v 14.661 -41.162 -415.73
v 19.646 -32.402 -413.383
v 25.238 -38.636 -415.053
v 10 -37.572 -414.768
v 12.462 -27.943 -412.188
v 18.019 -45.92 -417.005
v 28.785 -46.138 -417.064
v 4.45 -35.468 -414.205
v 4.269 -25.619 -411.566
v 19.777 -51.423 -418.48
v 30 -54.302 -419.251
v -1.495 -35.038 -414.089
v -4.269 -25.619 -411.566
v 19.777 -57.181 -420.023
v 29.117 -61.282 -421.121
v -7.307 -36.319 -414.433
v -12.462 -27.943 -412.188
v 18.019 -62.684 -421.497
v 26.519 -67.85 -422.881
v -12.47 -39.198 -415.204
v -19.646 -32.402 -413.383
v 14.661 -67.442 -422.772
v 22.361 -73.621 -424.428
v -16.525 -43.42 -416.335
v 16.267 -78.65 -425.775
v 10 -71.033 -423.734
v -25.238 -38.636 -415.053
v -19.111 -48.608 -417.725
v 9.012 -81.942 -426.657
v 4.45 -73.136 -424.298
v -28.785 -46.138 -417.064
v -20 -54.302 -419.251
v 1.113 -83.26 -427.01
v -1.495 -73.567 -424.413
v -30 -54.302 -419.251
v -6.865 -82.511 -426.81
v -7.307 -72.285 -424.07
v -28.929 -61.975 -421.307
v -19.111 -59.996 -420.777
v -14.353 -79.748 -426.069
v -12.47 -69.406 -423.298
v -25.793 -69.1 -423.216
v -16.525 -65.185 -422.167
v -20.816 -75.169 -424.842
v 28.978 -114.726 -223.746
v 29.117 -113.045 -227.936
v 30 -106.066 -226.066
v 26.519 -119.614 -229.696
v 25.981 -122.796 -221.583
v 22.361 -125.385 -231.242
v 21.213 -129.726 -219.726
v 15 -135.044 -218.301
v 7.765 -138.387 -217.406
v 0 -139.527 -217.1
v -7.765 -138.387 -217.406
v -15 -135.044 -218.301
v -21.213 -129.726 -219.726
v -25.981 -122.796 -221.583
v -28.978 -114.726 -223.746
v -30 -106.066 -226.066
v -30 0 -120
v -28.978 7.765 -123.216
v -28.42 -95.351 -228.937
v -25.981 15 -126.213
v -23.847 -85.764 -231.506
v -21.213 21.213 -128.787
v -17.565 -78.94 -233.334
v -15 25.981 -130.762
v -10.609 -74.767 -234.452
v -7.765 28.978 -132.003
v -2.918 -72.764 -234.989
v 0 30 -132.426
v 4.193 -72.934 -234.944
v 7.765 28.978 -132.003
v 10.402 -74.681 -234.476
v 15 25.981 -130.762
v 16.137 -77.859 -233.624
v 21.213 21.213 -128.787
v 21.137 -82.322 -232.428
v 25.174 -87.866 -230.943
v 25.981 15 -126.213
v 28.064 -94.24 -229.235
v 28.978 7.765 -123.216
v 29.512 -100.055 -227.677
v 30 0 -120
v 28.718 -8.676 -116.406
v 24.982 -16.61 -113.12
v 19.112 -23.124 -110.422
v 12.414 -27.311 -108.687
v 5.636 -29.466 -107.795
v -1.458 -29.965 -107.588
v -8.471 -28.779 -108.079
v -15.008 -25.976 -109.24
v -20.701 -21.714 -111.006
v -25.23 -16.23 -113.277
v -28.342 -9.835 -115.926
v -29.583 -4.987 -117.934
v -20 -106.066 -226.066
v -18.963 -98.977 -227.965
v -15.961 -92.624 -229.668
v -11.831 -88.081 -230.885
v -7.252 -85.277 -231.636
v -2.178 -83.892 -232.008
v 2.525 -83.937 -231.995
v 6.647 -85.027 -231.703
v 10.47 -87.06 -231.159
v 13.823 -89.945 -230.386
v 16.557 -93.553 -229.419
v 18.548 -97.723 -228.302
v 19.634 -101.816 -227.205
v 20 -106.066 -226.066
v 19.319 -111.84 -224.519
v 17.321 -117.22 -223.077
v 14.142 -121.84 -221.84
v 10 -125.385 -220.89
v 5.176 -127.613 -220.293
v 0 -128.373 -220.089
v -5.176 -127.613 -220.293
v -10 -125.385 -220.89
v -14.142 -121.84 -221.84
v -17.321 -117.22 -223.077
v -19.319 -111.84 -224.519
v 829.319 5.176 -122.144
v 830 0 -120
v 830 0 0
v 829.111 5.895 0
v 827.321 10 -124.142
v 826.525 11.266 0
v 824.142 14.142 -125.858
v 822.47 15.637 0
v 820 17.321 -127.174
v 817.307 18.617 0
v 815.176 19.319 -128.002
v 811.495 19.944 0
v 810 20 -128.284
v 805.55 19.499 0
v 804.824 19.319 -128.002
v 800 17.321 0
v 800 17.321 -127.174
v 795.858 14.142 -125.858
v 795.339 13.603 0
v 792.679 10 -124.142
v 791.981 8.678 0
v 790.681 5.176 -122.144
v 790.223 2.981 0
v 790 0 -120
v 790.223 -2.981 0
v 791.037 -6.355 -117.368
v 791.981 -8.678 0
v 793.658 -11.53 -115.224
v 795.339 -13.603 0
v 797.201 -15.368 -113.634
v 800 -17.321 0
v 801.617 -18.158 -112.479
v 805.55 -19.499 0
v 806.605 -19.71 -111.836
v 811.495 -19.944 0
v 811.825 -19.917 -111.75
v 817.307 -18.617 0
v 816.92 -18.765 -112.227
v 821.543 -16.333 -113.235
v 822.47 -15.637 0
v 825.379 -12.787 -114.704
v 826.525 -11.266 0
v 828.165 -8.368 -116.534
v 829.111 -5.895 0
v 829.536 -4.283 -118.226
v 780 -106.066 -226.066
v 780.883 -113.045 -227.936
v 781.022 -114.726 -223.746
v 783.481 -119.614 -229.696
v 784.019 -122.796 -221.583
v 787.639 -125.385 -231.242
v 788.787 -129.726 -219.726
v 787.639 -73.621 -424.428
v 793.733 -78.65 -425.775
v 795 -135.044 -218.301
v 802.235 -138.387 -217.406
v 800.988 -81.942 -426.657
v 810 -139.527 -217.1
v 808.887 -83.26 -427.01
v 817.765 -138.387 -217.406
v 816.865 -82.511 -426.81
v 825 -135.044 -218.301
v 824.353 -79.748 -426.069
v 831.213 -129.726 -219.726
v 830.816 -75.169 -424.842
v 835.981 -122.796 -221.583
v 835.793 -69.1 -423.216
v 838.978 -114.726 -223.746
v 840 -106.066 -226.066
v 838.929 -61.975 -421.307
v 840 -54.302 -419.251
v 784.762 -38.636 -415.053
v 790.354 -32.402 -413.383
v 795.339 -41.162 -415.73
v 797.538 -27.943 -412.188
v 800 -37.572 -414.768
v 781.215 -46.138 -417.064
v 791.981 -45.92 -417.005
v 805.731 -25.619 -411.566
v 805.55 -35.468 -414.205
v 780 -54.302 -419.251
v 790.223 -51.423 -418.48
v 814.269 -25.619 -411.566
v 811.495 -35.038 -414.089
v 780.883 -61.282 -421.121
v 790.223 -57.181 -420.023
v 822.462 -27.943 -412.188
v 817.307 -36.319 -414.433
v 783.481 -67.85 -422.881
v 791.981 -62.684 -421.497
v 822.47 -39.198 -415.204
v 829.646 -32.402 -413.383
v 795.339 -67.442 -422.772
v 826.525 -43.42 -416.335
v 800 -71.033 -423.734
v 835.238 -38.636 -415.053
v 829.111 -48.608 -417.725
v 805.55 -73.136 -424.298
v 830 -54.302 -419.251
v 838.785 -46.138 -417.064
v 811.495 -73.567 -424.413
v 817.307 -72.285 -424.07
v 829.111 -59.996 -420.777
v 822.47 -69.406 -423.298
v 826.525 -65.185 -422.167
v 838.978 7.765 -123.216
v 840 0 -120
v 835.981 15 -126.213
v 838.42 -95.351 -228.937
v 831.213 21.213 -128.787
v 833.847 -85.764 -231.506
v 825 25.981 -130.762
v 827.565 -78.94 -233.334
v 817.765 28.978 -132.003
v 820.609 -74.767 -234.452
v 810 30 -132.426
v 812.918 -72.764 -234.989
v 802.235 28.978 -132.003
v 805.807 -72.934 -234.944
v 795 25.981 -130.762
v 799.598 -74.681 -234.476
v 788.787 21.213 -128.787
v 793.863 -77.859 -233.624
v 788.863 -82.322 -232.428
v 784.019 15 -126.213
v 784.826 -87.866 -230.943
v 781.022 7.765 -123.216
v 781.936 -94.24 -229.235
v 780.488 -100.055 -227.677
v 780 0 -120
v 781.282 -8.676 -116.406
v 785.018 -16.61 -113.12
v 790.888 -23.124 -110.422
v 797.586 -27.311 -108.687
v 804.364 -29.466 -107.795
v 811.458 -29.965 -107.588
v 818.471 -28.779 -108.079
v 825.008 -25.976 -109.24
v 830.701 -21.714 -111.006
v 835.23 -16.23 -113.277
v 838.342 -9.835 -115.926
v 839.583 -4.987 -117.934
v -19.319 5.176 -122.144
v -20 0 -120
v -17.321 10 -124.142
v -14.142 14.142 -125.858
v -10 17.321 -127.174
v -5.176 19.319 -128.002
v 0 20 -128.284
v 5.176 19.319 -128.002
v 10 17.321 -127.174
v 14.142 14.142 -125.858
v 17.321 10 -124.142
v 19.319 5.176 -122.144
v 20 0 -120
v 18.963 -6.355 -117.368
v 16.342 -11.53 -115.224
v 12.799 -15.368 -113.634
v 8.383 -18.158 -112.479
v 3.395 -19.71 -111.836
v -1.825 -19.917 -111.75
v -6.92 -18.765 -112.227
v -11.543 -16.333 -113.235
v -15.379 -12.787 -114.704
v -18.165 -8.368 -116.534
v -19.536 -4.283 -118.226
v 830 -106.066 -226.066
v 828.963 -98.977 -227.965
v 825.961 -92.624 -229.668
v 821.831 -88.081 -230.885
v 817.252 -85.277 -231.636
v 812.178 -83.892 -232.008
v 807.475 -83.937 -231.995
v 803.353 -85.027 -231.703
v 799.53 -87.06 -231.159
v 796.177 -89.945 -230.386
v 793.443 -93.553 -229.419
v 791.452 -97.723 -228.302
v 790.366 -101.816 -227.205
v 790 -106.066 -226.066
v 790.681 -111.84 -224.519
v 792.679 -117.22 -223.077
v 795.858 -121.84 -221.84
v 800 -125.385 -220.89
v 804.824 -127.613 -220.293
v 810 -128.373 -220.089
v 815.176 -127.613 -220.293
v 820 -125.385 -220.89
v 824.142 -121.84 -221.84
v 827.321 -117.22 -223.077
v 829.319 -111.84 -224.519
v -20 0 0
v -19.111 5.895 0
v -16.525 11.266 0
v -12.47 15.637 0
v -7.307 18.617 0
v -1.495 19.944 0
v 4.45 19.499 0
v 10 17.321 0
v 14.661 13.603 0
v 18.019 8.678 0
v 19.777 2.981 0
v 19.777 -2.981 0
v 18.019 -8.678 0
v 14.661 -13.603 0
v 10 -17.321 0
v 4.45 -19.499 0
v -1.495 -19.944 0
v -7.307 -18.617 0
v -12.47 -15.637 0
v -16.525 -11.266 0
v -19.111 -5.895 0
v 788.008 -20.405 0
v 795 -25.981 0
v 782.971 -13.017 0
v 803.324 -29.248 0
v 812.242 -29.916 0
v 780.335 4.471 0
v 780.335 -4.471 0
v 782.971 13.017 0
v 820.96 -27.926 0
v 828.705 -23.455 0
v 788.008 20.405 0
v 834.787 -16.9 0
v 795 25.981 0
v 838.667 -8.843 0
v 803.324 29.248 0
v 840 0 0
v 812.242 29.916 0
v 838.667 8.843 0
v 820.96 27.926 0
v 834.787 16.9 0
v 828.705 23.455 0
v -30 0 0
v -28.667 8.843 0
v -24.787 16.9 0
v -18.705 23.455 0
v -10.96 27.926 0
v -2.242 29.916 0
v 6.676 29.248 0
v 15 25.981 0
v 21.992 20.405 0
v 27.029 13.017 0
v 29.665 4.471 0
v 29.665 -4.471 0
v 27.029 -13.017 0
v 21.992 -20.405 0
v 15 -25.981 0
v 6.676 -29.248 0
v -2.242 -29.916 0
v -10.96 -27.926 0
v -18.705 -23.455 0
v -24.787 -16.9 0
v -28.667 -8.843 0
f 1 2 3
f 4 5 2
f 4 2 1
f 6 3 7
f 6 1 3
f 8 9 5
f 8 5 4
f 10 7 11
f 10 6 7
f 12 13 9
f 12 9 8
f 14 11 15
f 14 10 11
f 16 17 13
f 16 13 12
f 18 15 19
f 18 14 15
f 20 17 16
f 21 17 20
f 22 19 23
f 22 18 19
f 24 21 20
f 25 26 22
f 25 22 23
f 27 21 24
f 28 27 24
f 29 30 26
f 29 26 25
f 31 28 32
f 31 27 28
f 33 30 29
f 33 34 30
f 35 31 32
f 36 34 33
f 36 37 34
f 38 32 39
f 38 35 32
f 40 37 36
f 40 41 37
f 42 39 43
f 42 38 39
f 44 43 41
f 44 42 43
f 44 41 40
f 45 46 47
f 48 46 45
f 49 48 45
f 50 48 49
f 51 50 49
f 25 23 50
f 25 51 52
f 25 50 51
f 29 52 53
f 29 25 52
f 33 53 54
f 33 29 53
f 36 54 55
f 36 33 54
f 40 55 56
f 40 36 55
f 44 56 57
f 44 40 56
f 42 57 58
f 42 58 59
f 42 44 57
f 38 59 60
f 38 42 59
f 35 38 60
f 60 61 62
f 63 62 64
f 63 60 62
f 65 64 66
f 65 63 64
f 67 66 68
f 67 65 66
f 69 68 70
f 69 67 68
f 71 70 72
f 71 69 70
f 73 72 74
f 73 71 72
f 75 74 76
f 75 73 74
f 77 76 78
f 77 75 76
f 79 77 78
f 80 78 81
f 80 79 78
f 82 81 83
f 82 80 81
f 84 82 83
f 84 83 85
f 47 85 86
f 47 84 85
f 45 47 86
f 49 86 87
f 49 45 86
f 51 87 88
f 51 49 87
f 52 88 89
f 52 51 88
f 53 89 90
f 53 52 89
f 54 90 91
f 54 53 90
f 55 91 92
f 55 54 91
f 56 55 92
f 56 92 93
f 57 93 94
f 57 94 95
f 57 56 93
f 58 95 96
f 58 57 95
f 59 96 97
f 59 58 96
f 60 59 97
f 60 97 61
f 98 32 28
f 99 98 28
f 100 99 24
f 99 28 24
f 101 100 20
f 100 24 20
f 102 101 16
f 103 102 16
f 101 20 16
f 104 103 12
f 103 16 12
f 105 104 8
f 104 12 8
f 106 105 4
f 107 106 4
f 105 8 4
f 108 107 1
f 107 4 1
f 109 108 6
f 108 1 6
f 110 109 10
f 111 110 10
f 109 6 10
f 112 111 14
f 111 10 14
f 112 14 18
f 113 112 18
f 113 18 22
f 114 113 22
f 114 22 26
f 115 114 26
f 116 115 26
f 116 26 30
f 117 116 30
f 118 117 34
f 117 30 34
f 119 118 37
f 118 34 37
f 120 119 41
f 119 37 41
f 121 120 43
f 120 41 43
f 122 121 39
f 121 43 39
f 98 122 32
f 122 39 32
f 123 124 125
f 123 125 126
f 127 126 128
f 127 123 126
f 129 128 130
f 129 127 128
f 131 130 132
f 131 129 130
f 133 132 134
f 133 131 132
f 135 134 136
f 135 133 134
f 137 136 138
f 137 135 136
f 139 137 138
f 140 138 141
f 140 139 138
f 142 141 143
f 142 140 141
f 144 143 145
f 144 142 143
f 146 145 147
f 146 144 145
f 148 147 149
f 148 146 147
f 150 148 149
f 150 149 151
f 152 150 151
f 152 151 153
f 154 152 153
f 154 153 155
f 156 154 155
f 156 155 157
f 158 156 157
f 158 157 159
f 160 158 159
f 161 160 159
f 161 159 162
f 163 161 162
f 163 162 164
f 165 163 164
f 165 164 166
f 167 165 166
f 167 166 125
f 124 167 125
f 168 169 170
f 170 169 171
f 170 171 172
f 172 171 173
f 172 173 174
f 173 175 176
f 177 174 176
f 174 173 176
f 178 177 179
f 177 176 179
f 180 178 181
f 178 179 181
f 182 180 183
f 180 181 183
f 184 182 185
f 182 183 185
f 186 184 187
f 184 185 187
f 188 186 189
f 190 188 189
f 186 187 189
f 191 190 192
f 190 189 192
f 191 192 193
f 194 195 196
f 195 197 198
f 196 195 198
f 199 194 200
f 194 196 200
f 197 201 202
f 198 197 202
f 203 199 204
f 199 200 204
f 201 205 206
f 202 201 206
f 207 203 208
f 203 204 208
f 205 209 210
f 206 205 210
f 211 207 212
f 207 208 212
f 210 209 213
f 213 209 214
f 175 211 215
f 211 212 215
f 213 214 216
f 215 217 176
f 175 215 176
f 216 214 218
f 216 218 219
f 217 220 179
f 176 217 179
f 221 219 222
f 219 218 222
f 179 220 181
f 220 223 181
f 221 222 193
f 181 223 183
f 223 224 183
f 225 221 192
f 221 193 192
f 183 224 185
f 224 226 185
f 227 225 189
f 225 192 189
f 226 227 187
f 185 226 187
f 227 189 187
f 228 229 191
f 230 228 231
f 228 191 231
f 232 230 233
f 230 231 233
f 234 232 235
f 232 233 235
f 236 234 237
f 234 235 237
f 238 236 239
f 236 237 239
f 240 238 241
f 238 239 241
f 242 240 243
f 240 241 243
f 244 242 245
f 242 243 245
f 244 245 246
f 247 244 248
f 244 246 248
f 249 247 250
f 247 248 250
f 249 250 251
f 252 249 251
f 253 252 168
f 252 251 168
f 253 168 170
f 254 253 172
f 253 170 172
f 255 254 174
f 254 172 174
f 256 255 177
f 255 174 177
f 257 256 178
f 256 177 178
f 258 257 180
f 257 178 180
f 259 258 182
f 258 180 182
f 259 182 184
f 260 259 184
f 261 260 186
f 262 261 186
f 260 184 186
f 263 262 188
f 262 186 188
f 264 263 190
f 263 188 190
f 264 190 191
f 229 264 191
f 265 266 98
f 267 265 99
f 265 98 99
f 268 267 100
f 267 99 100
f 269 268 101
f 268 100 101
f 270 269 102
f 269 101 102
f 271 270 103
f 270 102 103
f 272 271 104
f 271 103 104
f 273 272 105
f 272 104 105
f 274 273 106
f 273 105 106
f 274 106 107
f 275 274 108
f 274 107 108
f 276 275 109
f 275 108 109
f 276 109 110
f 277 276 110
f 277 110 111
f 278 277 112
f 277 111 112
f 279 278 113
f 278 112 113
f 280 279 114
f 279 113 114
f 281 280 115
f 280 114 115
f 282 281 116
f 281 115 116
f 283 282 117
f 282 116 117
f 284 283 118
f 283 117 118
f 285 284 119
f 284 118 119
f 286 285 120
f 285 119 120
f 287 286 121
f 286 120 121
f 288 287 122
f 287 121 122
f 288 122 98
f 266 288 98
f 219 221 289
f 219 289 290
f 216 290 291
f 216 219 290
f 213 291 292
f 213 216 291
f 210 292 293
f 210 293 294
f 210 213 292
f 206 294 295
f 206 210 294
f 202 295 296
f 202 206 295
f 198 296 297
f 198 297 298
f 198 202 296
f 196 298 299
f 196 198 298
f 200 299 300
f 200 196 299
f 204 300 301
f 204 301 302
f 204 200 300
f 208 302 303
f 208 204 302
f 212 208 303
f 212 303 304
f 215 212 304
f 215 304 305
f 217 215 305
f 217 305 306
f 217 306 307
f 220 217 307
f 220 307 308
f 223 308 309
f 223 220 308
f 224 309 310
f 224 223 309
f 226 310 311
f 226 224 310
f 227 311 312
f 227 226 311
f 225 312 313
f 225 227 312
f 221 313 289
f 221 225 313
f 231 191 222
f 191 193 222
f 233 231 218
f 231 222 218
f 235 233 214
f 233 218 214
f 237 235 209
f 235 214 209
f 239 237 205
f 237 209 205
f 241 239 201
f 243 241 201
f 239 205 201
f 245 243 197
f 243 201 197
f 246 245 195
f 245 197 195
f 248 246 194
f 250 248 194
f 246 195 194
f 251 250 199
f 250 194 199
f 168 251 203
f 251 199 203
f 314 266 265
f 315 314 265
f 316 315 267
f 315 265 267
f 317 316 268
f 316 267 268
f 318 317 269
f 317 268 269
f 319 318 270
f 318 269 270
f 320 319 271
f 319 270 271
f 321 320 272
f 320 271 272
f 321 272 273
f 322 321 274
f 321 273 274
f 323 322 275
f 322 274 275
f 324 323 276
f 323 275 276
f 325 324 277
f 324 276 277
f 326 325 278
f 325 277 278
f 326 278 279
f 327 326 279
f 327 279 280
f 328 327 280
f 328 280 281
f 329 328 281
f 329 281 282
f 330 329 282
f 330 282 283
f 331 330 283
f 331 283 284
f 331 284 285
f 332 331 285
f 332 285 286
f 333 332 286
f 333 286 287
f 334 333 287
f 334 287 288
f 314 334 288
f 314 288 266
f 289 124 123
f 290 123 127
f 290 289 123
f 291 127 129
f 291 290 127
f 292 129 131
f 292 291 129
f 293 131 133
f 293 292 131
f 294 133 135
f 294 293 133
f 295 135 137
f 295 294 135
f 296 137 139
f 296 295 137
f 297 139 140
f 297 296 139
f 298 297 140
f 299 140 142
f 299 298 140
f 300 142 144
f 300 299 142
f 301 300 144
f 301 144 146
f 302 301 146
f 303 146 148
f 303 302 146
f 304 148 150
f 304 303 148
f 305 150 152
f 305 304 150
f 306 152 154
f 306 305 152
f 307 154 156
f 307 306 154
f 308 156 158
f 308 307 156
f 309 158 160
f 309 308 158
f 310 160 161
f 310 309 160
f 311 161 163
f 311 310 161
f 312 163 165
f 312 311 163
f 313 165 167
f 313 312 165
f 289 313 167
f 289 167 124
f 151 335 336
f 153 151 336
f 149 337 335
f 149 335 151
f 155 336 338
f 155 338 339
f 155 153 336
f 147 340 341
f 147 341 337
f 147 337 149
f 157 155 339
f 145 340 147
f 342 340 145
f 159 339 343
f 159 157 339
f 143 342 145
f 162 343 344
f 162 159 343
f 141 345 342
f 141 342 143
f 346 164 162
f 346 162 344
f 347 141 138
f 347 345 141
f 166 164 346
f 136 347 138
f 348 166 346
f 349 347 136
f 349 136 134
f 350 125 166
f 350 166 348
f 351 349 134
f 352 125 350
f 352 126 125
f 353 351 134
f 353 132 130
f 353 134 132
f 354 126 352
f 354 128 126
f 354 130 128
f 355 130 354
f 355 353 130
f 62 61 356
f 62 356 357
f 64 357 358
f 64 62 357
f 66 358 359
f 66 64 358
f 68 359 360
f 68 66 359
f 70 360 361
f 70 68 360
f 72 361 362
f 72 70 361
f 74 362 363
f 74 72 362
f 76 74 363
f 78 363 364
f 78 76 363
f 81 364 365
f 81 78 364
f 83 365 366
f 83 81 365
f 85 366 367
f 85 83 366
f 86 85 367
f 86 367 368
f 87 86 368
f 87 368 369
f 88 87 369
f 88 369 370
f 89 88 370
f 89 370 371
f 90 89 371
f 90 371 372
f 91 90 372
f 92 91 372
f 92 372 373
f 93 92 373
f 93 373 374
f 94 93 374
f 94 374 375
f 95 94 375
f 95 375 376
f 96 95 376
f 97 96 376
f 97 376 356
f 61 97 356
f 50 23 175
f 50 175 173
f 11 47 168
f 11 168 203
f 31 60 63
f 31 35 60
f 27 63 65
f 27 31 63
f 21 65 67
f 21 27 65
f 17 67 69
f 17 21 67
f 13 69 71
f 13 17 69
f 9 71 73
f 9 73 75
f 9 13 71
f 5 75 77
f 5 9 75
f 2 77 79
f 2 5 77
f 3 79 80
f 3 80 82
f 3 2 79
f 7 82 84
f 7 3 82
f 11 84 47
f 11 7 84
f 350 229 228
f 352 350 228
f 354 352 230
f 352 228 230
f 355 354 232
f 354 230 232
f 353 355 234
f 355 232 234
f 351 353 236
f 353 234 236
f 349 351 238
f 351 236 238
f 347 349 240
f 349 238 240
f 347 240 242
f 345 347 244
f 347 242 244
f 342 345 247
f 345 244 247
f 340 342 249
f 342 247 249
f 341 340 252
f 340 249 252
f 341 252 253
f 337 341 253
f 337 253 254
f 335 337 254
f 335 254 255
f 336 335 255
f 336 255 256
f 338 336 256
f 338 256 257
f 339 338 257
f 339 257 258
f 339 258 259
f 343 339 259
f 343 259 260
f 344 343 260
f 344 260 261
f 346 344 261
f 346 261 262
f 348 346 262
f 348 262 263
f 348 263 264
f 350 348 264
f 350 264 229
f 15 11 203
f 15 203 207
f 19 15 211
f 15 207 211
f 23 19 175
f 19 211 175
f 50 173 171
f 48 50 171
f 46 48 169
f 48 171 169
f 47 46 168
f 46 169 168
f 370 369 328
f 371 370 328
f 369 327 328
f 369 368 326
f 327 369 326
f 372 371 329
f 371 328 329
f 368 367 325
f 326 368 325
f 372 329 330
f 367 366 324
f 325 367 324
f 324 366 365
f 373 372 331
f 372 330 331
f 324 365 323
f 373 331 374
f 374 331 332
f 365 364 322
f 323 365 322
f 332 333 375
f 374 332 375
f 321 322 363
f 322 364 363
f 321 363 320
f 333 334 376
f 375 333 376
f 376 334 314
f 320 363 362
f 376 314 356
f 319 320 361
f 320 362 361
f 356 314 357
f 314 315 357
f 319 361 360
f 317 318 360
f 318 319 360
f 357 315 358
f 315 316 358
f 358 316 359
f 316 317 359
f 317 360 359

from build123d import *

# Parameters (mm, degrees)
SWEEP_THIN1_PROFILE_R   = 30
SWEEP_THIN1_PROFILE_R_2 = 20
EXTRUDE_THIN1_START     = 20
EXTRUDE_THIN1_DEPTH     = 760


with BuildPart() as part:
    # Sweep-Thin1: sweep along a path in Sketch2
    with BuildLine(Plane(origin=(0, 0, 0), x_dir=(0, 0, -1), z_dir=(1, 0, 0))) as sweep_thin1_path:
        Line((0, 0), (120, 0))
        Line((120, 0), (226.066017178, -106.066017178))
        Line((226.066017178, -106.066017178), (419.251182436, -54.302208157))
    # Sweep-Thin1 profile (on start of the path) → Sweep-Thin1 (sweep)
    with BuildSketch(Plane(origin=(0, 0, 0), x_dir=(-1, 0, 0), z_dir=(0, 0, -1))):
        Circle(SWEEP_THIN1_PROFILE_R)
        Circle(SWEEP_THIN1_PROFILE_R_2, mode=Mode.SUBTRACT)
    sweep(path=sweep_thin1_path.line, transition=Transition.RIGHT)

    # Sketch13 → Extrude-Thin1 (add)
    with BuildSketch(Plane(origin=(0, 0, 0), x_dir=(0, 0, -1), z_dir=(1, 0, 0)).offset(EXTRUDE_THIN1_START)):
        Polygon((226.066017178, -106.066017178), (419.251182436, -54.302208157), (424.427563338, -73.620724683), (231.24239808, -125.384533704), align=None)
    extrude(amount=EXTRUDE_THIN1_DEPTH)

    # Mirror4: part across plane


with BuildPart() as part_1:
    add(part.part)
    add(part.part.mirror(Plane(origin=(405, 0, 0), x_dir=(0, 0, 1), z_dir=(1, 0, 0))))


solid = part_1.part
